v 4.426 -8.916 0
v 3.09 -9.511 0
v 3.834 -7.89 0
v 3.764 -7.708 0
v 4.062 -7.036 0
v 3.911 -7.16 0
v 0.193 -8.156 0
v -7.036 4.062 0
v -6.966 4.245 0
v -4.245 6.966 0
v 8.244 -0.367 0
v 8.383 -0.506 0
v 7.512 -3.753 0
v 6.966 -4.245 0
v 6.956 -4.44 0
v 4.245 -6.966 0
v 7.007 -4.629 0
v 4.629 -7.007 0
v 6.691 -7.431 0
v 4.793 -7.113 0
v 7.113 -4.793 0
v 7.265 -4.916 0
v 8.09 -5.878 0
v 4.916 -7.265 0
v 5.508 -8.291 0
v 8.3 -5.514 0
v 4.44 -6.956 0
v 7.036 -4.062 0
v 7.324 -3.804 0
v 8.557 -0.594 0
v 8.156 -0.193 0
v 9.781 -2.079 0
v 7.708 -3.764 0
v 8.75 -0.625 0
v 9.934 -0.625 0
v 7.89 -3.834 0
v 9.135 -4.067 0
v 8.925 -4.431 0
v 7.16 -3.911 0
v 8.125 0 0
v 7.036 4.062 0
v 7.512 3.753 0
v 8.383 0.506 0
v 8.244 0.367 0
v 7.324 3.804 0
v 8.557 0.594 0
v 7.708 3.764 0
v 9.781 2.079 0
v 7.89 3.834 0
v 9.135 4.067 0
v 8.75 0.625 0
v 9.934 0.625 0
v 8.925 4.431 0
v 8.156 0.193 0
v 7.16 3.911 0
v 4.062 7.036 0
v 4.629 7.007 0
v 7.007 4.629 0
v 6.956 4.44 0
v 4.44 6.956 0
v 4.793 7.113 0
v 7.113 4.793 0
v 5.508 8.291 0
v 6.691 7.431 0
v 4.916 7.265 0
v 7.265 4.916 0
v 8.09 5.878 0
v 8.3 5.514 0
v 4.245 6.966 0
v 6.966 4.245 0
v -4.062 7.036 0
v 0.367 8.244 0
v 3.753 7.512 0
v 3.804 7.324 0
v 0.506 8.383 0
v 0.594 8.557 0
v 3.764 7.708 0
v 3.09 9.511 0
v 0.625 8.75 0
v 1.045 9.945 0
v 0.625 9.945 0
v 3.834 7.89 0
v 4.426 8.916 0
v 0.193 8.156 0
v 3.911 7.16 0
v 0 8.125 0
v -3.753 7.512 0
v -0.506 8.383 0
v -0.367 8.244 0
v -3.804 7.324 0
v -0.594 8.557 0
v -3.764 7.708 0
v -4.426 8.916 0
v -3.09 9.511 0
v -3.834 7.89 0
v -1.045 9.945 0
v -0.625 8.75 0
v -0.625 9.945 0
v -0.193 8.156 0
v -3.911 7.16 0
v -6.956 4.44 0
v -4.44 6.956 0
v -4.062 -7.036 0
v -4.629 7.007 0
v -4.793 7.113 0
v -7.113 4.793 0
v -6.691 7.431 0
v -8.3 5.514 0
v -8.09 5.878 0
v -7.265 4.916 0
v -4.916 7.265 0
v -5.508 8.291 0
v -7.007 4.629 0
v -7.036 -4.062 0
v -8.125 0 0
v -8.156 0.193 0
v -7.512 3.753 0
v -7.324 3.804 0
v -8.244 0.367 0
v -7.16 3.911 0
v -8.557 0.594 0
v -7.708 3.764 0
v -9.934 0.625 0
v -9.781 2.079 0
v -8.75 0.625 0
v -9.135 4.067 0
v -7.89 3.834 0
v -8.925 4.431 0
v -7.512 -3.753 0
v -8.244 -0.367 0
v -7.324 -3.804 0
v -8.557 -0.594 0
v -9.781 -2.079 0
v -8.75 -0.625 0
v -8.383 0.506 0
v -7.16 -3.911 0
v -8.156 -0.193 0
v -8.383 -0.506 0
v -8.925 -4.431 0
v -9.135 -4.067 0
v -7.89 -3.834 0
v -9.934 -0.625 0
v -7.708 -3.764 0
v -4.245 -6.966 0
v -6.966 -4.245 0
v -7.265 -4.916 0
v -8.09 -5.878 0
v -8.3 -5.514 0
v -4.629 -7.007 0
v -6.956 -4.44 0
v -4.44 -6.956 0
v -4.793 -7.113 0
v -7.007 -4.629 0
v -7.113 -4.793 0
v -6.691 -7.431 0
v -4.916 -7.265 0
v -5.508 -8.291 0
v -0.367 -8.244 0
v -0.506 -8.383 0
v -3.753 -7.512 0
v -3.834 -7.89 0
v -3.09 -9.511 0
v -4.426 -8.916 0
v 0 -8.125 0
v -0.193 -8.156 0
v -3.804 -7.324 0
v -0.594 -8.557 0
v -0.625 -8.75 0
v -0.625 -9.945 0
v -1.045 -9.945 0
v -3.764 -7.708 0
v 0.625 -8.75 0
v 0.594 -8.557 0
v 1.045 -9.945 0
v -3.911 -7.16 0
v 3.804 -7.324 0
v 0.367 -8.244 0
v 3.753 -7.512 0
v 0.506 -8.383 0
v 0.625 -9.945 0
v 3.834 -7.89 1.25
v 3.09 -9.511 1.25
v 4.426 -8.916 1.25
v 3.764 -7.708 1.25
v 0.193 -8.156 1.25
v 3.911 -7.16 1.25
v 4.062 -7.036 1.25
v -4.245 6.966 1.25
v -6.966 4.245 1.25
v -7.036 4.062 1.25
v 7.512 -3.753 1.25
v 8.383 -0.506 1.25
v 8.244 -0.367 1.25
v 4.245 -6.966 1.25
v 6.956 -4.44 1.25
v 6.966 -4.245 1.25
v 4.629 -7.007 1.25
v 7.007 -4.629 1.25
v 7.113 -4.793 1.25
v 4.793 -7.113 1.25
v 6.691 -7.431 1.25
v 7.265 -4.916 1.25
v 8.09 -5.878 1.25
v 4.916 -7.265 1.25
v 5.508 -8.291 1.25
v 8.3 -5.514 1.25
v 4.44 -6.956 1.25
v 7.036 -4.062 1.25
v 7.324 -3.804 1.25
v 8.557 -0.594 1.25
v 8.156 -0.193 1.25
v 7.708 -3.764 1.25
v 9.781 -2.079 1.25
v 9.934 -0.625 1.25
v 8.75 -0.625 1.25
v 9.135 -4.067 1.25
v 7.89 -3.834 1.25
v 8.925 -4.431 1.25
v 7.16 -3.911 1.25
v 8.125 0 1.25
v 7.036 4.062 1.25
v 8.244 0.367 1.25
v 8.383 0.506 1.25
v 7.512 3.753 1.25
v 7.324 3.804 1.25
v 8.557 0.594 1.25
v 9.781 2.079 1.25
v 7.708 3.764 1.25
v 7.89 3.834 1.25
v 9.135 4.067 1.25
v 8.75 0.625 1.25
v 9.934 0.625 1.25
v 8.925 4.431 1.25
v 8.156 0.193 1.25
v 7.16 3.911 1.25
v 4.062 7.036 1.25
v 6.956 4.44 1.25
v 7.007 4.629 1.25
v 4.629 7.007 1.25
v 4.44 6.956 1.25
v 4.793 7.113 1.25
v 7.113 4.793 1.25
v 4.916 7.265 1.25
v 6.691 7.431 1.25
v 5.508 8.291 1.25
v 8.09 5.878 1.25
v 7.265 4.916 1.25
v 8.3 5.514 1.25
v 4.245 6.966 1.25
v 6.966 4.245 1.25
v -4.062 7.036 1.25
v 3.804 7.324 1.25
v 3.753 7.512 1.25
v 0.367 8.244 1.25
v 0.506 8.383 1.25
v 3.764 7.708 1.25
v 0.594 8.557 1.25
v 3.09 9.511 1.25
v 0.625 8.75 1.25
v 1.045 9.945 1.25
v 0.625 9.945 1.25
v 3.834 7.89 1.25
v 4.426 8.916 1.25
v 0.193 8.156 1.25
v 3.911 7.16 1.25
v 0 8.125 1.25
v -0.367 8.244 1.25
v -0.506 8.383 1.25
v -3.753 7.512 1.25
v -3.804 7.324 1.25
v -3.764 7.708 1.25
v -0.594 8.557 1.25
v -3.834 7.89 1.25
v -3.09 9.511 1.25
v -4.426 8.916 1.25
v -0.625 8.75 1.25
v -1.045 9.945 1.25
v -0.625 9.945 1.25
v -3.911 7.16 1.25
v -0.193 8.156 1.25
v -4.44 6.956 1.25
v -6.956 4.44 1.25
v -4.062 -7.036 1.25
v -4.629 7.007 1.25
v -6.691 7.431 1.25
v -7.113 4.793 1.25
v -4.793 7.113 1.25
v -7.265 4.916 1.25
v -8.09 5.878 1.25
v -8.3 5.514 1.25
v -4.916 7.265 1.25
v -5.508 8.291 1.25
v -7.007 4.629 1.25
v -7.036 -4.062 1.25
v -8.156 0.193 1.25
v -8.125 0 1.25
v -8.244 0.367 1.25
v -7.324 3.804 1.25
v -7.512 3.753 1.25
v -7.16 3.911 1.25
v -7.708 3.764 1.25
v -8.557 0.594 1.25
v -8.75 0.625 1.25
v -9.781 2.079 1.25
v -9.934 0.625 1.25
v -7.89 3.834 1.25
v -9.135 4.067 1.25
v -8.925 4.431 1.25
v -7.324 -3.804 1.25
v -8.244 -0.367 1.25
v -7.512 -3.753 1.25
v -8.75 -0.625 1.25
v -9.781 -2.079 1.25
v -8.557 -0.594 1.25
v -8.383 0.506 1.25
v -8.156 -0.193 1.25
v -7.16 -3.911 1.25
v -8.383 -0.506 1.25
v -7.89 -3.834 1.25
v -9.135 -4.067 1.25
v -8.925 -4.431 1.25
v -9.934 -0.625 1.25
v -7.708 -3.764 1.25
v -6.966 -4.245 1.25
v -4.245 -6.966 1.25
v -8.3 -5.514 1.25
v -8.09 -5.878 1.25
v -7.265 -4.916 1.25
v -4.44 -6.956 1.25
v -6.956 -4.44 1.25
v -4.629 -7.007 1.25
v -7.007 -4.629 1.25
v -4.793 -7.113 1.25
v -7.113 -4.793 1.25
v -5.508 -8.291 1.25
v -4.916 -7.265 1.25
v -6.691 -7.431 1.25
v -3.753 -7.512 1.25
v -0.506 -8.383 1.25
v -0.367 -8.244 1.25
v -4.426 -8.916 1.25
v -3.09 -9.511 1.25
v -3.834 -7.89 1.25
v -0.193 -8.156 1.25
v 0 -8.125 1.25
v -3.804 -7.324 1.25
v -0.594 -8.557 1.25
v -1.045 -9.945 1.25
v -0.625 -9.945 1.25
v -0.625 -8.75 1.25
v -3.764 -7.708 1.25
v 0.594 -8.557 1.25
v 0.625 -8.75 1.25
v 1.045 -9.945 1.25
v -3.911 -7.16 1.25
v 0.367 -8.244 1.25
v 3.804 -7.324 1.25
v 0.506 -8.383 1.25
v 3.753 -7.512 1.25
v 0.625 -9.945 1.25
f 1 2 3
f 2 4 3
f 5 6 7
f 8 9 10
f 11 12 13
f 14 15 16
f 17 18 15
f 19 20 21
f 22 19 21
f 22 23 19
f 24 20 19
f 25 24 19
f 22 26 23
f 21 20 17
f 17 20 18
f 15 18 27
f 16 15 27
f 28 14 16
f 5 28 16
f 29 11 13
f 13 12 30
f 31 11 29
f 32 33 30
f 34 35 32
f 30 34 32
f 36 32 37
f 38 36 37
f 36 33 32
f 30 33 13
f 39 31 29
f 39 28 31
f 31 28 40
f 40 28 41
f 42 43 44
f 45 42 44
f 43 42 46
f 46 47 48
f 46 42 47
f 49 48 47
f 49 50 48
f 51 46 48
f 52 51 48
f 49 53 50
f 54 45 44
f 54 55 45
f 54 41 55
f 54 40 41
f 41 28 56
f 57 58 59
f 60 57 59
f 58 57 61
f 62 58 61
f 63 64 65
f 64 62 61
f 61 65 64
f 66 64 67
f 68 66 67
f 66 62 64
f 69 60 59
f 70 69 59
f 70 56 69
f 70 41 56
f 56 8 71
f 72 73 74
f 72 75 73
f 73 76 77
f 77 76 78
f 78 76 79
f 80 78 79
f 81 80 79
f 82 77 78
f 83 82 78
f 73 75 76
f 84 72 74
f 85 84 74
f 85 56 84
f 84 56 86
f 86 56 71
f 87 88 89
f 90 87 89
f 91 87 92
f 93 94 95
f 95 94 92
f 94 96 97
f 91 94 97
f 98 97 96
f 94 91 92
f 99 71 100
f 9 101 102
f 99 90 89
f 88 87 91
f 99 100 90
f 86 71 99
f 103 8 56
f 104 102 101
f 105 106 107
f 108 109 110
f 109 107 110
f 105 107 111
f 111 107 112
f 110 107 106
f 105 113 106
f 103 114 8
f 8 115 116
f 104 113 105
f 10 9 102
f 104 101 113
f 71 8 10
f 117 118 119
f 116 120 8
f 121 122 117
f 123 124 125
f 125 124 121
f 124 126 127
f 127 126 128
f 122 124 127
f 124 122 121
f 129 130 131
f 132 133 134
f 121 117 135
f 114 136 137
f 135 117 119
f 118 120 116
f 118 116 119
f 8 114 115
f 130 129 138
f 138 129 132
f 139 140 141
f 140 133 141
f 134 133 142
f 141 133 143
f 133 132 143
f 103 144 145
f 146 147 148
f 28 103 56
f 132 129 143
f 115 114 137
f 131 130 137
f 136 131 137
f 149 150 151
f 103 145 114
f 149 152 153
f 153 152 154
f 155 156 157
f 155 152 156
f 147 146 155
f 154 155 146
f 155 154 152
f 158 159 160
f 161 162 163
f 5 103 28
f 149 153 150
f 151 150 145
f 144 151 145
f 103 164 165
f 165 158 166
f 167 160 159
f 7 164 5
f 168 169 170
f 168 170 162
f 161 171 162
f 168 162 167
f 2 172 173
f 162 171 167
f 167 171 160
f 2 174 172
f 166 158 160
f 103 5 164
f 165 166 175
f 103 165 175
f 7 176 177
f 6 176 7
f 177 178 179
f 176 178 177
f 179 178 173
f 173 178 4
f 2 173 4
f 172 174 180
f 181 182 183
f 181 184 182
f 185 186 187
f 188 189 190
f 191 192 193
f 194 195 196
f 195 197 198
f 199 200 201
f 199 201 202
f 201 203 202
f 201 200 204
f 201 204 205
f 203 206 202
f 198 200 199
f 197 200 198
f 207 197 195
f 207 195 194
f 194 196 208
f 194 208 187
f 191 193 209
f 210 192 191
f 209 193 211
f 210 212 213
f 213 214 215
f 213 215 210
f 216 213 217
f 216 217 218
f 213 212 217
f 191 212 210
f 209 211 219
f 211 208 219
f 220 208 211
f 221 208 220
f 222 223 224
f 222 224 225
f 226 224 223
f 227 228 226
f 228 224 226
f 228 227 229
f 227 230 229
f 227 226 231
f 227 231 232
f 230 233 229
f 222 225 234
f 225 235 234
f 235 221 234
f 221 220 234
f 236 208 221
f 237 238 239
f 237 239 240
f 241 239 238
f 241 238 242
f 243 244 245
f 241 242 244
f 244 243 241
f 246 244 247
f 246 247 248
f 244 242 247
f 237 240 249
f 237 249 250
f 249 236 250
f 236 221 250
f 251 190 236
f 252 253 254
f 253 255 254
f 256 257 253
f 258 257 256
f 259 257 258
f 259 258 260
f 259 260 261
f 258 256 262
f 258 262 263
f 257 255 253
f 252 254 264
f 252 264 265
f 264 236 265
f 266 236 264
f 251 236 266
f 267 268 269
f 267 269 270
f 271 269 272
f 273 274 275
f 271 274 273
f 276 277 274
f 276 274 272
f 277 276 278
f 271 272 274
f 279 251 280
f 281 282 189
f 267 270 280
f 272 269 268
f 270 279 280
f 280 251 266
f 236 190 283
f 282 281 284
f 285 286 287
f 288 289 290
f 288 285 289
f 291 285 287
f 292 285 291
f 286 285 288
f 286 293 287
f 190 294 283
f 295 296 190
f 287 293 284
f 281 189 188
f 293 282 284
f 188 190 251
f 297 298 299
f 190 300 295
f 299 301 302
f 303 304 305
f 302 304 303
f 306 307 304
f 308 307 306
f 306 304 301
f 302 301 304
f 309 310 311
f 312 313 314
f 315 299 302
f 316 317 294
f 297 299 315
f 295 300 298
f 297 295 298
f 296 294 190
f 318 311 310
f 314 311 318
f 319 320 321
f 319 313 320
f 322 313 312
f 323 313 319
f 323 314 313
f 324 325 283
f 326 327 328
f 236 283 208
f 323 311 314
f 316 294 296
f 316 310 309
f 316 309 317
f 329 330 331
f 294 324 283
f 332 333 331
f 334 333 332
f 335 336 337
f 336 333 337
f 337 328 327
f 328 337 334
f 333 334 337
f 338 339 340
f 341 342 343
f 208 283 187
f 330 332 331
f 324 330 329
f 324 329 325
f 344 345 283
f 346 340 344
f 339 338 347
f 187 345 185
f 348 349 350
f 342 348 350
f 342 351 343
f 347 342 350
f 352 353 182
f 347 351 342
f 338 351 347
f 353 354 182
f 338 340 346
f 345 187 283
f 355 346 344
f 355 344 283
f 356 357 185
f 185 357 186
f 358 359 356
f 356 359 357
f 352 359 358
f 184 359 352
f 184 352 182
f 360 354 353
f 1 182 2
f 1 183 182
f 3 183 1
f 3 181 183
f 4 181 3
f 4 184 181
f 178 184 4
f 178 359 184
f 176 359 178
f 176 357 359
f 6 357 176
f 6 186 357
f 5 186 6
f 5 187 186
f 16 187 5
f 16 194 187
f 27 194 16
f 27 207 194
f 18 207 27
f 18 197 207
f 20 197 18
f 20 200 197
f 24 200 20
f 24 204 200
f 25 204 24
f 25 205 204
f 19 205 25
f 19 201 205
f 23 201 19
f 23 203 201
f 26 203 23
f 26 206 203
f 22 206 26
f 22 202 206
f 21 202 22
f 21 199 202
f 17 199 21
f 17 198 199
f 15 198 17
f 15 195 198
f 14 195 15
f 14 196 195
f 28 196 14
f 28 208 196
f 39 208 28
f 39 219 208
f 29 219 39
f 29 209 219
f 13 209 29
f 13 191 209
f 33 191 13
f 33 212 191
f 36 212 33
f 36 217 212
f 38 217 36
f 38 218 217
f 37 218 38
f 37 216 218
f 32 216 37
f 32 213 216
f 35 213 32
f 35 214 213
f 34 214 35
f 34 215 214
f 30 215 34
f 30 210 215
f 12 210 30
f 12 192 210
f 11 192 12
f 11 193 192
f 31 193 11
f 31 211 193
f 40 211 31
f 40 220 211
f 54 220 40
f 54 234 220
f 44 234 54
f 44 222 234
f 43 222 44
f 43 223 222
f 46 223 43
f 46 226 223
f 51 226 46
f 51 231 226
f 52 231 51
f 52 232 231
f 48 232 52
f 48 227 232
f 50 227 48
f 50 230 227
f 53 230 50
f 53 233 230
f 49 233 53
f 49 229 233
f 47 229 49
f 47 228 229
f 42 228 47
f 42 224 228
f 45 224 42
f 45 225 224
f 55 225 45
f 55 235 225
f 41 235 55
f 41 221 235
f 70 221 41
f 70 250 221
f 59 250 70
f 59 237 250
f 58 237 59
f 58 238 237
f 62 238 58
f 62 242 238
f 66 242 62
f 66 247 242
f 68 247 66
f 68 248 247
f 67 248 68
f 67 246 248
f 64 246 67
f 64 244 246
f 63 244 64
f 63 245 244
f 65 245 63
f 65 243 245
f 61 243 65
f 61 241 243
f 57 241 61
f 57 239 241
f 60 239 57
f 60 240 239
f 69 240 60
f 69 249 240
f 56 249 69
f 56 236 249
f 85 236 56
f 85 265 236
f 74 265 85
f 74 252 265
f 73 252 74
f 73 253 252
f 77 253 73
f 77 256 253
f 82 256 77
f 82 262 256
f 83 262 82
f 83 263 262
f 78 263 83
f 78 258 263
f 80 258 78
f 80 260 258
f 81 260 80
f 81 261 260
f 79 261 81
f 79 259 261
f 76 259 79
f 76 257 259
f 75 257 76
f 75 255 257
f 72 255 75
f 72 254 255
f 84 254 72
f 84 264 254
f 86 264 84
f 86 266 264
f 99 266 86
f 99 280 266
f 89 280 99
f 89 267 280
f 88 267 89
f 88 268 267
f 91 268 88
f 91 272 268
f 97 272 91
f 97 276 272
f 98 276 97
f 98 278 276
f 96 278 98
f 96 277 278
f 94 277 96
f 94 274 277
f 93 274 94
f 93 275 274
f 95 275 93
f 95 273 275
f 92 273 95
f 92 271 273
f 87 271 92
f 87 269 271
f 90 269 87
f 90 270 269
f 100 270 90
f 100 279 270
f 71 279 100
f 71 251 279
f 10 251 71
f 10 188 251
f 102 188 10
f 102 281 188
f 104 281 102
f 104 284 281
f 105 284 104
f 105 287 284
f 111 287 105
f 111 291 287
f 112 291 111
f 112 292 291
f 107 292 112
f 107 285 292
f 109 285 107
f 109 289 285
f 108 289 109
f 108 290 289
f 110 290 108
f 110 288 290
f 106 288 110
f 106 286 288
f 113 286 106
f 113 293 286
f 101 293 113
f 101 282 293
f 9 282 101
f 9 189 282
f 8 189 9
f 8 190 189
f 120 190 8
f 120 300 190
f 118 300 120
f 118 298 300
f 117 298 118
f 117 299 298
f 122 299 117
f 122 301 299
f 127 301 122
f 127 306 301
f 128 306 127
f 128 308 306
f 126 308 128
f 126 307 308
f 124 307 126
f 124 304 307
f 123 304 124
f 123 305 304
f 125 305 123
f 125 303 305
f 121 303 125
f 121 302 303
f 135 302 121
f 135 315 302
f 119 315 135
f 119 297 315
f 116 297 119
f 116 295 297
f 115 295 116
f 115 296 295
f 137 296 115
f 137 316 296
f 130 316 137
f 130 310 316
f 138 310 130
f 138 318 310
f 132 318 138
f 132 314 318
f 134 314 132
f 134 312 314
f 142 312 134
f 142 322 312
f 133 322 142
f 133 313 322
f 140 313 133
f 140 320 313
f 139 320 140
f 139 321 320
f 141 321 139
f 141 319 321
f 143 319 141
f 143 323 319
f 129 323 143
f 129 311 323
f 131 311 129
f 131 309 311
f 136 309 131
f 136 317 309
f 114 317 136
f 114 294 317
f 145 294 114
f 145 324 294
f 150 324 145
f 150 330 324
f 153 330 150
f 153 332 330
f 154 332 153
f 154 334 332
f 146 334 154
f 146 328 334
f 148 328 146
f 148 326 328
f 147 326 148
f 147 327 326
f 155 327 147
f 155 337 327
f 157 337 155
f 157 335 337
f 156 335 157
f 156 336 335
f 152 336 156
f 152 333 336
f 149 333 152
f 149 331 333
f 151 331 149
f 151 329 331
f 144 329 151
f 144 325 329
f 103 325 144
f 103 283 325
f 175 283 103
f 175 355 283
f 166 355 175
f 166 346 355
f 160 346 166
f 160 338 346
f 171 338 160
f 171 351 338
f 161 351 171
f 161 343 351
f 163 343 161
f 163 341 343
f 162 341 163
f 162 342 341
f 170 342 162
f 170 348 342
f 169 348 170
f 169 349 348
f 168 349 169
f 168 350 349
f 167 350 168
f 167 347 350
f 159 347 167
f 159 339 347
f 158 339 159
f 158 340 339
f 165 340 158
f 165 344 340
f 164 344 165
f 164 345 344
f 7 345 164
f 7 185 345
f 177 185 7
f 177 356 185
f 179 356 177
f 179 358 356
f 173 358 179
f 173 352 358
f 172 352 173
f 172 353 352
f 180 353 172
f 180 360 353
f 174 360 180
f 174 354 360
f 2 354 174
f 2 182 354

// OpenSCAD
//when laser cutting, material thickness must be [bbsize] or greater.

gearr = 10; //Radius of Gear (mm)
bbsize = 1.25; //Size of bb to be dispensed (mm)
skipint = 1; //Number of notches to skip each time.

module notch(r){
	rotate(r)
	translate([0,gearr-bbsize,0])
	scale([0.1,0.1,1])
		union(){
			circle(bbsize*5);
			translate([-bbsize*5,0,0])square(bbsize*10);
		}
}

module notchring() {
	trueskip=skipint+1;
	gearc = (2*PI*gearr);
	gearint = 360/(gearc/bbsize);
	notchcount=round(((360-gearint)/(gearint*2))/trueskip);
	gearremain=360-(notchcount*gearint);
	geargap=gearremain/notchcount;
	for ( q = [0:gearint+geargap:360-geargap] ) {
		notch(q);
	}
}

module gear() {
	linear_extrude(bbsize)difference() {
		circle(gearr);
		notchring();
	}
}

gear();
